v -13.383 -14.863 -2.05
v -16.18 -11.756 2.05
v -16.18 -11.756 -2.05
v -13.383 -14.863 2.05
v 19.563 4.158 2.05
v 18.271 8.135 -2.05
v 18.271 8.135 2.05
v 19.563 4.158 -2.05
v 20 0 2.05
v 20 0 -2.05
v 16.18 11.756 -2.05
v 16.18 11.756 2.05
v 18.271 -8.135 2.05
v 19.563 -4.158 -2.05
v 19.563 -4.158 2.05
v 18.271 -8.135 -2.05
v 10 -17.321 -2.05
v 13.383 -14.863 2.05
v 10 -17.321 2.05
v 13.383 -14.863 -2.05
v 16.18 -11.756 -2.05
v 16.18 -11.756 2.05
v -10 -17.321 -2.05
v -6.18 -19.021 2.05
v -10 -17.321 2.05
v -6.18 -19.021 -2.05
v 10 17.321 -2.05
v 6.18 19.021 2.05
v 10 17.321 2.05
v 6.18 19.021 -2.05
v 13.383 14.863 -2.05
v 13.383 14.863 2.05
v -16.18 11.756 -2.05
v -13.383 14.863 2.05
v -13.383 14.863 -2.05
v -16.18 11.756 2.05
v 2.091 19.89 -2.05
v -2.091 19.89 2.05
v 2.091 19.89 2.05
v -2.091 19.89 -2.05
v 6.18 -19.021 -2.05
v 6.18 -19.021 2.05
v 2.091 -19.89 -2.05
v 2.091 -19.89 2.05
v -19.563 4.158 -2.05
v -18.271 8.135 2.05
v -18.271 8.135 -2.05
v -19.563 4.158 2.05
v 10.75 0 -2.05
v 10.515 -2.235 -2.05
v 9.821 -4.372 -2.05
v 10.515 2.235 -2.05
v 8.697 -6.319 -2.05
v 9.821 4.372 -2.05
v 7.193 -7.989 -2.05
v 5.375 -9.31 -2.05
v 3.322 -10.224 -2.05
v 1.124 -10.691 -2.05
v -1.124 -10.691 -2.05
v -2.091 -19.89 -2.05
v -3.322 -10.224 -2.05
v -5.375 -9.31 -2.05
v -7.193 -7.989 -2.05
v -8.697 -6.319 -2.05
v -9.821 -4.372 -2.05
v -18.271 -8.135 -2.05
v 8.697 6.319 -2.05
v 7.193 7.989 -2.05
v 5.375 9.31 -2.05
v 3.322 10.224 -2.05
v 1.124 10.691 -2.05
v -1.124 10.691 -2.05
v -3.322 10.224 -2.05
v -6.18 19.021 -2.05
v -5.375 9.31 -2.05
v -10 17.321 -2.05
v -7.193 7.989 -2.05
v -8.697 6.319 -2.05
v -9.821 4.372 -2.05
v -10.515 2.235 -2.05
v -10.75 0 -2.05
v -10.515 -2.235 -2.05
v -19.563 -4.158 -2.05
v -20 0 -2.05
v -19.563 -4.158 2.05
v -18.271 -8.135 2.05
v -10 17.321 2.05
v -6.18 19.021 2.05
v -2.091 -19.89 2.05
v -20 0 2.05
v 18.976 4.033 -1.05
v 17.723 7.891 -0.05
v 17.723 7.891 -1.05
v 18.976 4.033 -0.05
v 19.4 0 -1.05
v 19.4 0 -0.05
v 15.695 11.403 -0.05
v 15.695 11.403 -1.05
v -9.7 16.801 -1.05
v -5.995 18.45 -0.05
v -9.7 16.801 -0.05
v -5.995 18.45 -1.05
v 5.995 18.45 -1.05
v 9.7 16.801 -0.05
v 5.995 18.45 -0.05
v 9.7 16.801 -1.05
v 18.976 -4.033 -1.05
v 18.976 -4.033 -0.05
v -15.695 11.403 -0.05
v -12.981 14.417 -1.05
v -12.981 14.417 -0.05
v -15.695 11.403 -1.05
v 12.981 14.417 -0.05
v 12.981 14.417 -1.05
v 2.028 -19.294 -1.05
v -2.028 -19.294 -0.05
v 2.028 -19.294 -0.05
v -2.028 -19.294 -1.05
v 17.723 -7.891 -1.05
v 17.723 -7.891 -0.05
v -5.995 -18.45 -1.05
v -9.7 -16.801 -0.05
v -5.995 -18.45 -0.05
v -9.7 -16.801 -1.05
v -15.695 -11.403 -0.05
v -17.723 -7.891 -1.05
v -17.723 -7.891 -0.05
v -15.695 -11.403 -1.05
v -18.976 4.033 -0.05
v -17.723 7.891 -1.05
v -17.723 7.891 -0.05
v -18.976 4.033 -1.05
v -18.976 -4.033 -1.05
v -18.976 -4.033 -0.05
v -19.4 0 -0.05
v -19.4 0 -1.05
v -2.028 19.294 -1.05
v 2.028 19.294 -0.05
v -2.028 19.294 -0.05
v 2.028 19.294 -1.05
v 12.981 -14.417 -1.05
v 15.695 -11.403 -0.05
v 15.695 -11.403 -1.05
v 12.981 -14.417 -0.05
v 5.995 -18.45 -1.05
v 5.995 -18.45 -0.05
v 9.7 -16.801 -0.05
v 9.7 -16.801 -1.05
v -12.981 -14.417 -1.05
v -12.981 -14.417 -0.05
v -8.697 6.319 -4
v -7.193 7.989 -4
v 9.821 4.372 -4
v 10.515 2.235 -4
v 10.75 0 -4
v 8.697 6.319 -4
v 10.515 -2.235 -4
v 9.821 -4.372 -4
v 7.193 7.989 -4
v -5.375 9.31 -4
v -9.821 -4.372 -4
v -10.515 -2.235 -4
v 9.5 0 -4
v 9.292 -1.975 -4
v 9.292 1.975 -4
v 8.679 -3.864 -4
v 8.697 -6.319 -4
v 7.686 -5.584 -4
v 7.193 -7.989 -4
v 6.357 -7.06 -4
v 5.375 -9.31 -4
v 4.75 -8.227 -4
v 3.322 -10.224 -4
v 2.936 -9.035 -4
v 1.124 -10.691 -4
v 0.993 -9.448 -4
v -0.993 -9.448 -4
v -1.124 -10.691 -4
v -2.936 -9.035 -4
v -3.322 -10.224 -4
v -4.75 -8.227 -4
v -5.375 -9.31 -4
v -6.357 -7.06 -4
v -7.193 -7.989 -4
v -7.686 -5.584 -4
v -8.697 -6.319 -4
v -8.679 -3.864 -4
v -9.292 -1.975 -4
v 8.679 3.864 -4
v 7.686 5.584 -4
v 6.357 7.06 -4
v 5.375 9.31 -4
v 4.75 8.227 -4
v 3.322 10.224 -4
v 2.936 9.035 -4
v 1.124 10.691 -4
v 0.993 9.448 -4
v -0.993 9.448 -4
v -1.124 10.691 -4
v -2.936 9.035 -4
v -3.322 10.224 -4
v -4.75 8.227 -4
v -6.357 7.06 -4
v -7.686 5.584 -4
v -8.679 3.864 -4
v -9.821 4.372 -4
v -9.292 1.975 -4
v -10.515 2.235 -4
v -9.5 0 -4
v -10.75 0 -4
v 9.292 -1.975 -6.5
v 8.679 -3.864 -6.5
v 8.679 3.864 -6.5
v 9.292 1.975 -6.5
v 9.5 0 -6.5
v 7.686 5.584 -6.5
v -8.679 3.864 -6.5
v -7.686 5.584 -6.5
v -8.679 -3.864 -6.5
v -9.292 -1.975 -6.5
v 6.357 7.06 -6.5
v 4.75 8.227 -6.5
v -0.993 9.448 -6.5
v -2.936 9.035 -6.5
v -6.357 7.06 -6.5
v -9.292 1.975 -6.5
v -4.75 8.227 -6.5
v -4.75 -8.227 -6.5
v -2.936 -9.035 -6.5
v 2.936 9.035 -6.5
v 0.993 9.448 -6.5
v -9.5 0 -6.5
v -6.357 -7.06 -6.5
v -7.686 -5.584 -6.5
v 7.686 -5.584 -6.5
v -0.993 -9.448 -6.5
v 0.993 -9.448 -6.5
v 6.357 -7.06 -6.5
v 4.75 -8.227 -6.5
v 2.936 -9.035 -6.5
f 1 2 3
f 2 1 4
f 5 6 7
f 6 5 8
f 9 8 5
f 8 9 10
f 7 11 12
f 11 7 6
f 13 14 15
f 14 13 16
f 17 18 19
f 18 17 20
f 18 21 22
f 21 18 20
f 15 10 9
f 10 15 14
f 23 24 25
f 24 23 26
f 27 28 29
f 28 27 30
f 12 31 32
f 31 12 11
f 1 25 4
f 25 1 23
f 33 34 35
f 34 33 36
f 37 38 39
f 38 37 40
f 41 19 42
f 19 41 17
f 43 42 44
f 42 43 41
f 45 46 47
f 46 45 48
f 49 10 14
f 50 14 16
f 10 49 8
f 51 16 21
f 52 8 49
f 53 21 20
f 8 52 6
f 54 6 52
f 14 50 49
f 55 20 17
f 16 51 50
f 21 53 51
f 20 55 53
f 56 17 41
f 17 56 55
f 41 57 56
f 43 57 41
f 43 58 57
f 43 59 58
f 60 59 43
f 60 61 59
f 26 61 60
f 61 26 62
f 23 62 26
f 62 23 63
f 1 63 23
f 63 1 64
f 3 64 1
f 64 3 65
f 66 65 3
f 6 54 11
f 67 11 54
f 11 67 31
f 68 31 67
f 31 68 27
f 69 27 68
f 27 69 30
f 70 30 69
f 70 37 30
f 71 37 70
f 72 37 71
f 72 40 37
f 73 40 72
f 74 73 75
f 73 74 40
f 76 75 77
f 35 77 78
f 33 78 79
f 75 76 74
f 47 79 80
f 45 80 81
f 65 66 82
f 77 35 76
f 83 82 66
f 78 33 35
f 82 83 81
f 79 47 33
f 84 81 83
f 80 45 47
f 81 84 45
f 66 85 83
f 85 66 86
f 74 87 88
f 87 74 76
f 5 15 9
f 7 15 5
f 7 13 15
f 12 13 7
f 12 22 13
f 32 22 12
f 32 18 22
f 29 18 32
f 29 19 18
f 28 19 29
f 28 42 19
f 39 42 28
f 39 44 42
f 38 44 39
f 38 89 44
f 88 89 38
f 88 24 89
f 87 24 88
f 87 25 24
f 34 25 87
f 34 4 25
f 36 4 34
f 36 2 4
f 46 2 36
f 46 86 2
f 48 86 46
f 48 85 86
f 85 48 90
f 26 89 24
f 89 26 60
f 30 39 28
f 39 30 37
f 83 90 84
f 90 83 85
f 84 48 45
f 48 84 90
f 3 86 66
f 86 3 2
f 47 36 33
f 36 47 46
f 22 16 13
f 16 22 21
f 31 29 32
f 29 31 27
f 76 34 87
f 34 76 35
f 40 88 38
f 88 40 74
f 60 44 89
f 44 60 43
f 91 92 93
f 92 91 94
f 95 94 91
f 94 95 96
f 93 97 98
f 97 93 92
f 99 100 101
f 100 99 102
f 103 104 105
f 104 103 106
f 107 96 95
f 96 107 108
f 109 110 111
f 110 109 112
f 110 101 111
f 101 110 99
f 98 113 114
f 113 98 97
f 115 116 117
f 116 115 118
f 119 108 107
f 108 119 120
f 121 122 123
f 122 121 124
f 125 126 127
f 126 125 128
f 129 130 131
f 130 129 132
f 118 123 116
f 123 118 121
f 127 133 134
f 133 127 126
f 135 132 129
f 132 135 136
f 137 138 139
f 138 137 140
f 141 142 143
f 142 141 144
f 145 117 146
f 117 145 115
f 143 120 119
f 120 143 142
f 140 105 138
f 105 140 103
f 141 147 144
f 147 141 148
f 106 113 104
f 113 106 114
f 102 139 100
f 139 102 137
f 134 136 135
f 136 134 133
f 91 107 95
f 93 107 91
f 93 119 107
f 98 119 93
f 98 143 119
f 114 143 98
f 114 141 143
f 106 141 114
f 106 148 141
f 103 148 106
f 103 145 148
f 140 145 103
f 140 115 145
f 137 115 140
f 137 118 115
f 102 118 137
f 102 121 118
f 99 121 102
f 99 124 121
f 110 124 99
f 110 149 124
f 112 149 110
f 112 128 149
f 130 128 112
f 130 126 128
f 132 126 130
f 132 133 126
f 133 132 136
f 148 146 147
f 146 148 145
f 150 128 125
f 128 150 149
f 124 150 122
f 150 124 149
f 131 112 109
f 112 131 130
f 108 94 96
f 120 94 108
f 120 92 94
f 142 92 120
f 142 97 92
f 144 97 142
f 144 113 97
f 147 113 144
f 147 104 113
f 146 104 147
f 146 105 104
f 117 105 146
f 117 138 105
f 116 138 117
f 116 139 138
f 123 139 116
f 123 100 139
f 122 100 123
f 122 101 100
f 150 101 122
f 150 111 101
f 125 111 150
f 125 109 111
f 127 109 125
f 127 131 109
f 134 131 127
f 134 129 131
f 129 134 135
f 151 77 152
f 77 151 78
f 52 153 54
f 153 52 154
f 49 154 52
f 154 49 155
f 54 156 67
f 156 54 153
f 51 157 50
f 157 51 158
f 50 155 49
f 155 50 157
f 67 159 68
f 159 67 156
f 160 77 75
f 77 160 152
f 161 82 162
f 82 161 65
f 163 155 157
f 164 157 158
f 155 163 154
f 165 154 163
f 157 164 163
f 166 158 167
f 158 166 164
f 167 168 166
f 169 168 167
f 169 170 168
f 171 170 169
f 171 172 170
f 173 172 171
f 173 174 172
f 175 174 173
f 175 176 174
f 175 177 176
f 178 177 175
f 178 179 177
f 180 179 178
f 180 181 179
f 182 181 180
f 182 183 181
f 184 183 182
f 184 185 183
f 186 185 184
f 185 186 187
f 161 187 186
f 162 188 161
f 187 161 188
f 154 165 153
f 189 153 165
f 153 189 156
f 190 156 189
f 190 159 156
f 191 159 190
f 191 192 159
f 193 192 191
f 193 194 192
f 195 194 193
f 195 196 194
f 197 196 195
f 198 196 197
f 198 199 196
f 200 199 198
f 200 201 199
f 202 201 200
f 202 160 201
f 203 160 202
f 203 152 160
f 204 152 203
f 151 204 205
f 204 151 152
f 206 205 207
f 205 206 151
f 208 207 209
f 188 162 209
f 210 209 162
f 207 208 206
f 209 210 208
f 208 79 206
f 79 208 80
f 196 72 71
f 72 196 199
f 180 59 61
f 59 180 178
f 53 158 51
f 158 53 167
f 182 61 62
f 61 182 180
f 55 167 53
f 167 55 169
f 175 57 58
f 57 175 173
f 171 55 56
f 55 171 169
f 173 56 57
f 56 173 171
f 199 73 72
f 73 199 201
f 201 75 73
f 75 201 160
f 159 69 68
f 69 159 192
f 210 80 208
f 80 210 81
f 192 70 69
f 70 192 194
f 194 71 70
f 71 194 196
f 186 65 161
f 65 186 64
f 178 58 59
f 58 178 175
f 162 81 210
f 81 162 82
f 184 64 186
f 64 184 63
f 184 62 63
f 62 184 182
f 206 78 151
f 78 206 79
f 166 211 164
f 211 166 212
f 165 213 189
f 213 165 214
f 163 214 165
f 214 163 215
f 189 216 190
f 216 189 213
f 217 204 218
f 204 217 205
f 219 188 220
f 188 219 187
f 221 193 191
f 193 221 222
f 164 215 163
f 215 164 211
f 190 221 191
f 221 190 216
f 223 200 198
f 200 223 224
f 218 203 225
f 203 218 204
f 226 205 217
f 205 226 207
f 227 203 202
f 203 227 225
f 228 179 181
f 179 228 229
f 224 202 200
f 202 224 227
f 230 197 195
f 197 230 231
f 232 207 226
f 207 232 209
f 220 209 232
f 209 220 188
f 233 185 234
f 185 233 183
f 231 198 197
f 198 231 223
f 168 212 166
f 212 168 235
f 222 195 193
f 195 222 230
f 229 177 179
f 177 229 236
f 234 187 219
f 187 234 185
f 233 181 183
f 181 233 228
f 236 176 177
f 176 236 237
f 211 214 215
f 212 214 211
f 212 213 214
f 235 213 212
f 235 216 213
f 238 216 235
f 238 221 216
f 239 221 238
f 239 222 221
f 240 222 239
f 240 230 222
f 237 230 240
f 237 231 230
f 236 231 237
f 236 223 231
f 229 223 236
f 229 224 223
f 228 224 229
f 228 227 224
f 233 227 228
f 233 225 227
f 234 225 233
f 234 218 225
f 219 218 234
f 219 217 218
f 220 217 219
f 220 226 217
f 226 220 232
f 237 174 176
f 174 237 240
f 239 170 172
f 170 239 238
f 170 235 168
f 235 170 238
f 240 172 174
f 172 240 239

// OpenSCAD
//$fa=0.01;
//$fs=0.5;

module athElement() {
	union() {
		difference() {
			color("dimgray")
			cylinder(r=20,h=4.1,center=true);
			translate([0,0,1])
				cylinder(r=19.4,h=4.1,center=true);
		}
		color("silver")
		translate([0,0,1])
		cylinder(r=19.4,h=2.1,center=true);
			
		color("dimgray")
		translate([0,0,-3])
		cylinder(r=21.5/2,h=2,center=true);

		translate([0,0,-5])
		cylinder(r=19/2,h=3,center=true);		
	}
}

module aliceElement() {

}

athElement();
aliceElement();
